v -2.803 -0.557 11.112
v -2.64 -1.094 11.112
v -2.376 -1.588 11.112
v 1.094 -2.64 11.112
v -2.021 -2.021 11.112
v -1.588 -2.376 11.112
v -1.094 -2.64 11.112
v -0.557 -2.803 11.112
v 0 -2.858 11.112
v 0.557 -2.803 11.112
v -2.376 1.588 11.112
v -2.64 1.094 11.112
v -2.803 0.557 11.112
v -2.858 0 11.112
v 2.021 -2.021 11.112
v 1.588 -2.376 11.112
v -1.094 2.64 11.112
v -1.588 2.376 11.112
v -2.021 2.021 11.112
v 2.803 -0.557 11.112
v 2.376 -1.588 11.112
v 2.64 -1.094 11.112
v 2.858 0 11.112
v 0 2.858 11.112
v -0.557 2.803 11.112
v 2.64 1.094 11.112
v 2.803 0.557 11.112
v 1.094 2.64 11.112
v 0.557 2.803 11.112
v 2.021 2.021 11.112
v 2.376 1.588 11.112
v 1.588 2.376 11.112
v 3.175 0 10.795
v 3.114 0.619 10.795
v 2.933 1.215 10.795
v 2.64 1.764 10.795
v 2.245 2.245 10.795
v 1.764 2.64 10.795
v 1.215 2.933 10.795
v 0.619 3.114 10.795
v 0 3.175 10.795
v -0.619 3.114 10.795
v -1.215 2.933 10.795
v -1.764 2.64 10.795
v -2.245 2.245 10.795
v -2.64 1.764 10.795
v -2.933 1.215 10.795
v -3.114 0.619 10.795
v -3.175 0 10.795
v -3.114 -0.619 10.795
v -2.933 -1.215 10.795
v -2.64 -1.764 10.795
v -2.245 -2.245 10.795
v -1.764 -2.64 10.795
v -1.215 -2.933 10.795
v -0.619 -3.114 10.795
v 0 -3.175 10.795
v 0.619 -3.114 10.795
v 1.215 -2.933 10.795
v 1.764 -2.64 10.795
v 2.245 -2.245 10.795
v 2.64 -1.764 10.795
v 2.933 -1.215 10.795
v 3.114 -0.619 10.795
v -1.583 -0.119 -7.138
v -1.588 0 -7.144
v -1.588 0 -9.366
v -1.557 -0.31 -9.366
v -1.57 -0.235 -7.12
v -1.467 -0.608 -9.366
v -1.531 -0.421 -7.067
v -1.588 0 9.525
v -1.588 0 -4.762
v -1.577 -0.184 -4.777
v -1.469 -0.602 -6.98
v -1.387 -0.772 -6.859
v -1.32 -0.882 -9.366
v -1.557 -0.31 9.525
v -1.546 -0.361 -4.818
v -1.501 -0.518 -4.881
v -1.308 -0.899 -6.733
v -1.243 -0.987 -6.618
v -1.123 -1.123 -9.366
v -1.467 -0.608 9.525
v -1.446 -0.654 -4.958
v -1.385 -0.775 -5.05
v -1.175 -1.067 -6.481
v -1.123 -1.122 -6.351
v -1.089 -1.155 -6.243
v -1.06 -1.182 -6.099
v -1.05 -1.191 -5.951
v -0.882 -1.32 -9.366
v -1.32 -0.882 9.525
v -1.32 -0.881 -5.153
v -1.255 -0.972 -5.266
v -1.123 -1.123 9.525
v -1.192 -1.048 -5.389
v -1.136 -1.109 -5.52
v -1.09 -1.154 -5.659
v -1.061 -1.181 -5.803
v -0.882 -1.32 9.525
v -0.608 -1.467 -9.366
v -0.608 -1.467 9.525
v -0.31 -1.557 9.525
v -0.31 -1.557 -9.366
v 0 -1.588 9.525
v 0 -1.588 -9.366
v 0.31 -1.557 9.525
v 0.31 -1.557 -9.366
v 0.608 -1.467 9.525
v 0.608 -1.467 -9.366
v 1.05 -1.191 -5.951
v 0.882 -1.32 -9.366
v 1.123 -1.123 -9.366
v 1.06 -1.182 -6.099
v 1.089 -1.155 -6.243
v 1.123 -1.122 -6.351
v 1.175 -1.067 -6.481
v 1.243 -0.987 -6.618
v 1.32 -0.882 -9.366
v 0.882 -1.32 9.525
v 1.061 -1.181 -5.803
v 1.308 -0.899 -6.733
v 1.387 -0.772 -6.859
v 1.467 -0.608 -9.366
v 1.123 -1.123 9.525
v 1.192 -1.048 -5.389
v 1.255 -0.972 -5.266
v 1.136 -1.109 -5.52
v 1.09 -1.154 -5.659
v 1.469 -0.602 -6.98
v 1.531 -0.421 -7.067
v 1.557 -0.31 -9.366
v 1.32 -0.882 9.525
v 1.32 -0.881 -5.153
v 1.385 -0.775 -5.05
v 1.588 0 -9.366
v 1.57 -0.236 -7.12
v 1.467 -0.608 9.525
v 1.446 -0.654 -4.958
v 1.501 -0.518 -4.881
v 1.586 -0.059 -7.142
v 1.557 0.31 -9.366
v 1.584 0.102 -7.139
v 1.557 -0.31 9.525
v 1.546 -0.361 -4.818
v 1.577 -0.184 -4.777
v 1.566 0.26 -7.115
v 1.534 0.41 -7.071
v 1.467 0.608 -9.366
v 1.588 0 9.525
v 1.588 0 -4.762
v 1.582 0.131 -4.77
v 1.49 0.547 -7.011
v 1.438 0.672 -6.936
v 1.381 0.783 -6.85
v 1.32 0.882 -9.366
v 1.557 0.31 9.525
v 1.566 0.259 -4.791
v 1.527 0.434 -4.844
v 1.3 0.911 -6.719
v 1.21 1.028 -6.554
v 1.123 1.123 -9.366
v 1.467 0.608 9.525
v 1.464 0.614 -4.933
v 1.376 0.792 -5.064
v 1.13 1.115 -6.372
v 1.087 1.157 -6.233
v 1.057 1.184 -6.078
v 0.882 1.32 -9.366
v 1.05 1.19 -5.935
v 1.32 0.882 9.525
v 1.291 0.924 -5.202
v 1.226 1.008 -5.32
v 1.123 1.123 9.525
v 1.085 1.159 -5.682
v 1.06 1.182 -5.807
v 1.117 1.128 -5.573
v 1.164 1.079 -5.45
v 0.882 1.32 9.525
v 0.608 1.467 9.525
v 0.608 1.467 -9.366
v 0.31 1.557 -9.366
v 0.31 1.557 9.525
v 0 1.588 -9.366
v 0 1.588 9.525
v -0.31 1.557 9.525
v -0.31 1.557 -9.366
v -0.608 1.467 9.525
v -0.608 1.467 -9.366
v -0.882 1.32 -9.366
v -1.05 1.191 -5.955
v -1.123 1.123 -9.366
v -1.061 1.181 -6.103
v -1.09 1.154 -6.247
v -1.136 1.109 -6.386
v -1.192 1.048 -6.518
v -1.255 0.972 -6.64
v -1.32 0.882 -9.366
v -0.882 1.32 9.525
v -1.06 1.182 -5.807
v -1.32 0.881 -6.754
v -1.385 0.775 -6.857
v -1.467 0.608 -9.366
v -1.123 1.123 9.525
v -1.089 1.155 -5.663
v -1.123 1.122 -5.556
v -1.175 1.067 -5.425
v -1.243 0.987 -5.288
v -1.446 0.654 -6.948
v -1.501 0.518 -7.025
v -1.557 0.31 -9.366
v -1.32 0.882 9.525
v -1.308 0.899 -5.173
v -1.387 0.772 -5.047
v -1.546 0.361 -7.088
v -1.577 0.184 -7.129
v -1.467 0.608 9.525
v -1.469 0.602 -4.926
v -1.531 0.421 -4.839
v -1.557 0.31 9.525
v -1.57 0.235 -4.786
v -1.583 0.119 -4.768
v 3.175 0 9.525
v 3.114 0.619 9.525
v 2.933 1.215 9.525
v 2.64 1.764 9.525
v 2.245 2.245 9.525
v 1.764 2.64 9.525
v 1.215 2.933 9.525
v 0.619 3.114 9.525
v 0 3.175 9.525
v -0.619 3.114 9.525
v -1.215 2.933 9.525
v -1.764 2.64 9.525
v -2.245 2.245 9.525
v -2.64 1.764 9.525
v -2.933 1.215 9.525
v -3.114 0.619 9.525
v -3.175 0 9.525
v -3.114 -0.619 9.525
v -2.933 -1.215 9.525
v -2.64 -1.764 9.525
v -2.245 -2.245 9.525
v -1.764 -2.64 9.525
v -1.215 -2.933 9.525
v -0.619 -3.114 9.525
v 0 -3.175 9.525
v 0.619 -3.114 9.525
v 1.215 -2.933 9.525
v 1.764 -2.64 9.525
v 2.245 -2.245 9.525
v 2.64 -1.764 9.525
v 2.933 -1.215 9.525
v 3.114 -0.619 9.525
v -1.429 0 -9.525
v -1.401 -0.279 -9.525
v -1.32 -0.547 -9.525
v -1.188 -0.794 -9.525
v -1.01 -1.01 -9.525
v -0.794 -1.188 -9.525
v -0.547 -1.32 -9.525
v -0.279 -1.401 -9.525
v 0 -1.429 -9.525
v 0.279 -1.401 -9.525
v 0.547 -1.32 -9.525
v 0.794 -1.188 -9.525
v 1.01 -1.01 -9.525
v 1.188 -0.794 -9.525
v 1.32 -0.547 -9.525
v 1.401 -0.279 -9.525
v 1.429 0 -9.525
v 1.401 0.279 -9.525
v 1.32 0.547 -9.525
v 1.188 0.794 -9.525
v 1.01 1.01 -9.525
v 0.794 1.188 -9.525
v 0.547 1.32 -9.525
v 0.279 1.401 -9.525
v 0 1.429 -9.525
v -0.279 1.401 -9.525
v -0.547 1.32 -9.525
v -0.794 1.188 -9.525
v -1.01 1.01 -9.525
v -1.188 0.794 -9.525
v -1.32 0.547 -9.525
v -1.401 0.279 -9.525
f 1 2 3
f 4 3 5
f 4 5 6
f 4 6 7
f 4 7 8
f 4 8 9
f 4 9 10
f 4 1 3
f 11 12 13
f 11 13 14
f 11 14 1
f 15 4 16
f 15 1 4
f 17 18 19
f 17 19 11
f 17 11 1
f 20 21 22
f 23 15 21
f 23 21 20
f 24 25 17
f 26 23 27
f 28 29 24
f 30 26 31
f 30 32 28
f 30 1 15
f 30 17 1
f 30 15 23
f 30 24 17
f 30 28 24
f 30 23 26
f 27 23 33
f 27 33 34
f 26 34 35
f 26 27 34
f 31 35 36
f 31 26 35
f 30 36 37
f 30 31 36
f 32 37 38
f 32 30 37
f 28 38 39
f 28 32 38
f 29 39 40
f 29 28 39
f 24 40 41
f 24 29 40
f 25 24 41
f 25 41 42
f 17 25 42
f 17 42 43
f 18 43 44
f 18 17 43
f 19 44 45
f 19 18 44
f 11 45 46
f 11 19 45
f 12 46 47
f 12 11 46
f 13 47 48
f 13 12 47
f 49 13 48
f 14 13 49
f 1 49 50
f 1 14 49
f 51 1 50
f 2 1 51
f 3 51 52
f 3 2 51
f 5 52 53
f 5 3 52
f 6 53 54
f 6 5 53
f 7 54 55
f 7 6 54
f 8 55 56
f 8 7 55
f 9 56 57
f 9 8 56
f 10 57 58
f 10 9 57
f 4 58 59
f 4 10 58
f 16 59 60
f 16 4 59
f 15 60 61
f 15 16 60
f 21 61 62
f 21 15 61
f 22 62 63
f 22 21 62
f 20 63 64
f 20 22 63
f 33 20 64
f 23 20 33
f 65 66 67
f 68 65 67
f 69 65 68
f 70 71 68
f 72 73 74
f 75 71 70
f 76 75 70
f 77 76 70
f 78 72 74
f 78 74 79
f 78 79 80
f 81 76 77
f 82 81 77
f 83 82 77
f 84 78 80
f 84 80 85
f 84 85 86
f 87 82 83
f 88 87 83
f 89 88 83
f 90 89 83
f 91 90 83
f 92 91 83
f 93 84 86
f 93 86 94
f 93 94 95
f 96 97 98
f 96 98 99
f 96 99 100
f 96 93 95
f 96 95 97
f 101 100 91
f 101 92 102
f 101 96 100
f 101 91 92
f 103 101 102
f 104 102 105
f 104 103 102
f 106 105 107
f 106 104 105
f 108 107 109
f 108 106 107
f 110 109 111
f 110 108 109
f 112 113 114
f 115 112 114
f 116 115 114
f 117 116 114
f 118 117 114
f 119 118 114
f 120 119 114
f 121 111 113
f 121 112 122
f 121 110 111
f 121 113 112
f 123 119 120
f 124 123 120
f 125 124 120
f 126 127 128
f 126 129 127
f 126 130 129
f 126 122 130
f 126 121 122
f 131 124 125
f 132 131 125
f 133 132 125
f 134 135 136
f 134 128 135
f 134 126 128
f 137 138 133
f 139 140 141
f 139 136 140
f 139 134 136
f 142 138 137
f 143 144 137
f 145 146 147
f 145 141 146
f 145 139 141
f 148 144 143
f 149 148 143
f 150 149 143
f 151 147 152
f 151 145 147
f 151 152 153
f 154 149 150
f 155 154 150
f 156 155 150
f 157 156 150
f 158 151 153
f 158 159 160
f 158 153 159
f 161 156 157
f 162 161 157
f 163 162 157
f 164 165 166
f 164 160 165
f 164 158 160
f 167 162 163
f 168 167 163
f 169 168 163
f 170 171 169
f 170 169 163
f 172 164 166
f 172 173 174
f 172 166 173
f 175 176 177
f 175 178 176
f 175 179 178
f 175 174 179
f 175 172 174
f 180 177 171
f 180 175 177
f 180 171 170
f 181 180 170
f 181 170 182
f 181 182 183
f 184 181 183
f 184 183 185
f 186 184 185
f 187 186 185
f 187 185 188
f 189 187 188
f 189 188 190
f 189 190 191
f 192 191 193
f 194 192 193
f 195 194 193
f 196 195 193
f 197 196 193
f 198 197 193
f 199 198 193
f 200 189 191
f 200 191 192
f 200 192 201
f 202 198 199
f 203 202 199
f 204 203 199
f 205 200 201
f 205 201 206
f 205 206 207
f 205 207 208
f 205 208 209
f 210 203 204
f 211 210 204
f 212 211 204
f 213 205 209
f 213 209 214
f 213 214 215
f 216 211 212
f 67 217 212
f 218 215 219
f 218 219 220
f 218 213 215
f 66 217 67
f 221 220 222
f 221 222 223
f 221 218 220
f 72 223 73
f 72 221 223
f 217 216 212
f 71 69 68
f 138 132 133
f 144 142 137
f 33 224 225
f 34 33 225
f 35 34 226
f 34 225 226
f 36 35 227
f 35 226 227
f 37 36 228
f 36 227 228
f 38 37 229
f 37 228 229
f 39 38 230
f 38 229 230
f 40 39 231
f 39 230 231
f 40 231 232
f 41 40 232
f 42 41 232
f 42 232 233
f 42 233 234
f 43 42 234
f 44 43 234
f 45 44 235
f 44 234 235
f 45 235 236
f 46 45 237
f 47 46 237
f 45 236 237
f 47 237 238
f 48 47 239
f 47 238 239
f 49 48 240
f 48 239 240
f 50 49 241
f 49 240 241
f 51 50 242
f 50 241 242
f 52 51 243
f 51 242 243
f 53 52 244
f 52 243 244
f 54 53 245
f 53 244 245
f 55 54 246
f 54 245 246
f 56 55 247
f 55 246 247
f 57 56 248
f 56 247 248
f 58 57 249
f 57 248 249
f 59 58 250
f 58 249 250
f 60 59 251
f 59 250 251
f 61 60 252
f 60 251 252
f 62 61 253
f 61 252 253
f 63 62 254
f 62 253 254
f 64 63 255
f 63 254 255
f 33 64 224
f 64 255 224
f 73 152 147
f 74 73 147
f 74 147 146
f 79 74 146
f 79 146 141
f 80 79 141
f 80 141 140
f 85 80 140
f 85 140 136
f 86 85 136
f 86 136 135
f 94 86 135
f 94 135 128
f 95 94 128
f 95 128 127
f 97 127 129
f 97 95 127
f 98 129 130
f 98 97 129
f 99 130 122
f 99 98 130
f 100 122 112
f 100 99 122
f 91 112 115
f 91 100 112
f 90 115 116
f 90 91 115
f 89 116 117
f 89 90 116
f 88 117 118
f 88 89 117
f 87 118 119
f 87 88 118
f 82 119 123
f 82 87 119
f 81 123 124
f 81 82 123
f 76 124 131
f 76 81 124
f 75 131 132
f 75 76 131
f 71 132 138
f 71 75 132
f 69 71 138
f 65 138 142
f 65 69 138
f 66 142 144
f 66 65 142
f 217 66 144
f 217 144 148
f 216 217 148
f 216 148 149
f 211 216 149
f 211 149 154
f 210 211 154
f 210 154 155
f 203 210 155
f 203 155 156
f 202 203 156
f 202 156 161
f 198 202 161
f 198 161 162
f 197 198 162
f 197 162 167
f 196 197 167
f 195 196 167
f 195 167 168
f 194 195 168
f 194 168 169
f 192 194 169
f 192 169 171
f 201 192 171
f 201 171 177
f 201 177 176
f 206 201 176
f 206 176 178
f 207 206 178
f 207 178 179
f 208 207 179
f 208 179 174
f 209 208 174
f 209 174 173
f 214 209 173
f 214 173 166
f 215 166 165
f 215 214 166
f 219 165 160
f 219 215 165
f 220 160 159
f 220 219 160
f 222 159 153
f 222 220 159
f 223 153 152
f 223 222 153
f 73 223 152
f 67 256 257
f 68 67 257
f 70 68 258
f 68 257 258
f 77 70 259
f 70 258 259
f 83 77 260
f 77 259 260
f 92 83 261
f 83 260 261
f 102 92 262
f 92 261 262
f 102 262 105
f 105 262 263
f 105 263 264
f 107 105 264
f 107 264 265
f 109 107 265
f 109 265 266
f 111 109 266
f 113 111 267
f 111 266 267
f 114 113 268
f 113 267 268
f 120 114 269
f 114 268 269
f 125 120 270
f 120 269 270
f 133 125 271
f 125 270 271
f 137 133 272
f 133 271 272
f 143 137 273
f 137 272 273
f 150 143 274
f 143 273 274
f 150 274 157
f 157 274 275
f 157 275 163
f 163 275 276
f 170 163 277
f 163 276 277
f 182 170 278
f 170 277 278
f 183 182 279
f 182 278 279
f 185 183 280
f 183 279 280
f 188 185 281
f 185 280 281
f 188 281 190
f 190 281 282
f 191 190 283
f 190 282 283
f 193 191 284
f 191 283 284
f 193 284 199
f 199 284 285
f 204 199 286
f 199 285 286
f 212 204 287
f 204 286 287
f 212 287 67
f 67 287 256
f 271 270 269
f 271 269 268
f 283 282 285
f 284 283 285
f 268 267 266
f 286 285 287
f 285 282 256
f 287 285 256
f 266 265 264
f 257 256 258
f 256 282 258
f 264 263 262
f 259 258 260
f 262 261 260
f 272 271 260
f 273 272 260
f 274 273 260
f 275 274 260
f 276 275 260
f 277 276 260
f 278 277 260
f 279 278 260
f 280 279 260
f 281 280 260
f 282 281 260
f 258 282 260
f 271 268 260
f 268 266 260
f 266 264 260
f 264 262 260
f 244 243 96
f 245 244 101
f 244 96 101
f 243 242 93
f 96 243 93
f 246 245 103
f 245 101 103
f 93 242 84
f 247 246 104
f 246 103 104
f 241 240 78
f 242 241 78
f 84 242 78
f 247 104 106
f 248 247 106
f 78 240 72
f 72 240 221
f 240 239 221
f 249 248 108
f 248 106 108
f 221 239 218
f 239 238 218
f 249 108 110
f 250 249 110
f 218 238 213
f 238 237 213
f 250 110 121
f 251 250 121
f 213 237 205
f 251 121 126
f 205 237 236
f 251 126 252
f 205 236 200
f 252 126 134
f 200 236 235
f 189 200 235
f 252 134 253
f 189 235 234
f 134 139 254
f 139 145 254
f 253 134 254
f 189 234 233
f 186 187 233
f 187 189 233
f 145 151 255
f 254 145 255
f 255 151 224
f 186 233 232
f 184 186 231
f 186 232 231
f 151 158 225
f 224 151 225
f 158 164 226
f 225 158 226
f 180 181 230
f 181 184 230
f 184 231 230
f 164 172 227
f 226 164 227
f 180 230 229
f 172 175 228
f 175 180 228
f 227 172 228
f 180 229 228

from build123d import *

# Parameters (mm, degrees)
SKETCH1_R           = 1.5875
EXTRUDE1_DEPTH      = 9.525
SKETCH2_R           = 3.175
EXTRUDE2_DEPTH      = 1.5875
CHAMFER1_SIZE       = 0.3175
EXTRUDE3_DEPTH      = 12.985362166
EXTRUDE3_DEPTH_BACK = 12.985362166
SKETCH3_R           = 1.190625
CHAMFER2_SIZE       = 0.15875


with BuildPart() as part:
    # Sketch1 → Extrude1 (new, symmetric)
    with BuildSketch(Plane.XY):
        with Locations(Location((0, 0, 0), (0, 0, 180))):
            Circle(SKETCH1_R)
    extrude(amount=EXTRUDE1_DEPTH, both=True)

    # Sketch2 → Extrude2 (add)
    with BuildSketch(Plane.XY.offset(9.525)):
        Circle(SKETCH2_R)
    extrude(amount=EXTRUDE2_DEPTH)

    # Chamfer1
    chamfer1_edges = [part.edges().sort_by_distance(p)[0] for p in [
        (-3.175, 0, 11.1125),
    ]]
    chamfer(chamfer1_edges, length=CHAMFER1_SIZE)

    # Sketch3 → Extrude3 (cut, two sides: drawn at the far end of the back side and taken through both)
    with BuildSketch(Plane(origin=(0, 0, 0), x_dir=(0, 0, -1), z_dir=(1, 0, 0)).offset(-EXTRUDE3_DEPTH_BACK)):
        with Locations(Location((5.953125, 0, 0), (0, 0, 180))):
            Circle(SKETCH3_R)
    extrude(amount=EXTRUDE3_DEPTH + EXTRUDE3_DEPTH_BACK, mode=Mode.SUBTRACT)

    # Chamfer2
    chamfer2_edges = [part.edges().sort_by_distance(p)[0] for p in [
        (1.5875, 0, -9.525),
    ]]
    chamfer(chamfer2_edges, length=CHAMFER2_SIZE)


solid = part.part
